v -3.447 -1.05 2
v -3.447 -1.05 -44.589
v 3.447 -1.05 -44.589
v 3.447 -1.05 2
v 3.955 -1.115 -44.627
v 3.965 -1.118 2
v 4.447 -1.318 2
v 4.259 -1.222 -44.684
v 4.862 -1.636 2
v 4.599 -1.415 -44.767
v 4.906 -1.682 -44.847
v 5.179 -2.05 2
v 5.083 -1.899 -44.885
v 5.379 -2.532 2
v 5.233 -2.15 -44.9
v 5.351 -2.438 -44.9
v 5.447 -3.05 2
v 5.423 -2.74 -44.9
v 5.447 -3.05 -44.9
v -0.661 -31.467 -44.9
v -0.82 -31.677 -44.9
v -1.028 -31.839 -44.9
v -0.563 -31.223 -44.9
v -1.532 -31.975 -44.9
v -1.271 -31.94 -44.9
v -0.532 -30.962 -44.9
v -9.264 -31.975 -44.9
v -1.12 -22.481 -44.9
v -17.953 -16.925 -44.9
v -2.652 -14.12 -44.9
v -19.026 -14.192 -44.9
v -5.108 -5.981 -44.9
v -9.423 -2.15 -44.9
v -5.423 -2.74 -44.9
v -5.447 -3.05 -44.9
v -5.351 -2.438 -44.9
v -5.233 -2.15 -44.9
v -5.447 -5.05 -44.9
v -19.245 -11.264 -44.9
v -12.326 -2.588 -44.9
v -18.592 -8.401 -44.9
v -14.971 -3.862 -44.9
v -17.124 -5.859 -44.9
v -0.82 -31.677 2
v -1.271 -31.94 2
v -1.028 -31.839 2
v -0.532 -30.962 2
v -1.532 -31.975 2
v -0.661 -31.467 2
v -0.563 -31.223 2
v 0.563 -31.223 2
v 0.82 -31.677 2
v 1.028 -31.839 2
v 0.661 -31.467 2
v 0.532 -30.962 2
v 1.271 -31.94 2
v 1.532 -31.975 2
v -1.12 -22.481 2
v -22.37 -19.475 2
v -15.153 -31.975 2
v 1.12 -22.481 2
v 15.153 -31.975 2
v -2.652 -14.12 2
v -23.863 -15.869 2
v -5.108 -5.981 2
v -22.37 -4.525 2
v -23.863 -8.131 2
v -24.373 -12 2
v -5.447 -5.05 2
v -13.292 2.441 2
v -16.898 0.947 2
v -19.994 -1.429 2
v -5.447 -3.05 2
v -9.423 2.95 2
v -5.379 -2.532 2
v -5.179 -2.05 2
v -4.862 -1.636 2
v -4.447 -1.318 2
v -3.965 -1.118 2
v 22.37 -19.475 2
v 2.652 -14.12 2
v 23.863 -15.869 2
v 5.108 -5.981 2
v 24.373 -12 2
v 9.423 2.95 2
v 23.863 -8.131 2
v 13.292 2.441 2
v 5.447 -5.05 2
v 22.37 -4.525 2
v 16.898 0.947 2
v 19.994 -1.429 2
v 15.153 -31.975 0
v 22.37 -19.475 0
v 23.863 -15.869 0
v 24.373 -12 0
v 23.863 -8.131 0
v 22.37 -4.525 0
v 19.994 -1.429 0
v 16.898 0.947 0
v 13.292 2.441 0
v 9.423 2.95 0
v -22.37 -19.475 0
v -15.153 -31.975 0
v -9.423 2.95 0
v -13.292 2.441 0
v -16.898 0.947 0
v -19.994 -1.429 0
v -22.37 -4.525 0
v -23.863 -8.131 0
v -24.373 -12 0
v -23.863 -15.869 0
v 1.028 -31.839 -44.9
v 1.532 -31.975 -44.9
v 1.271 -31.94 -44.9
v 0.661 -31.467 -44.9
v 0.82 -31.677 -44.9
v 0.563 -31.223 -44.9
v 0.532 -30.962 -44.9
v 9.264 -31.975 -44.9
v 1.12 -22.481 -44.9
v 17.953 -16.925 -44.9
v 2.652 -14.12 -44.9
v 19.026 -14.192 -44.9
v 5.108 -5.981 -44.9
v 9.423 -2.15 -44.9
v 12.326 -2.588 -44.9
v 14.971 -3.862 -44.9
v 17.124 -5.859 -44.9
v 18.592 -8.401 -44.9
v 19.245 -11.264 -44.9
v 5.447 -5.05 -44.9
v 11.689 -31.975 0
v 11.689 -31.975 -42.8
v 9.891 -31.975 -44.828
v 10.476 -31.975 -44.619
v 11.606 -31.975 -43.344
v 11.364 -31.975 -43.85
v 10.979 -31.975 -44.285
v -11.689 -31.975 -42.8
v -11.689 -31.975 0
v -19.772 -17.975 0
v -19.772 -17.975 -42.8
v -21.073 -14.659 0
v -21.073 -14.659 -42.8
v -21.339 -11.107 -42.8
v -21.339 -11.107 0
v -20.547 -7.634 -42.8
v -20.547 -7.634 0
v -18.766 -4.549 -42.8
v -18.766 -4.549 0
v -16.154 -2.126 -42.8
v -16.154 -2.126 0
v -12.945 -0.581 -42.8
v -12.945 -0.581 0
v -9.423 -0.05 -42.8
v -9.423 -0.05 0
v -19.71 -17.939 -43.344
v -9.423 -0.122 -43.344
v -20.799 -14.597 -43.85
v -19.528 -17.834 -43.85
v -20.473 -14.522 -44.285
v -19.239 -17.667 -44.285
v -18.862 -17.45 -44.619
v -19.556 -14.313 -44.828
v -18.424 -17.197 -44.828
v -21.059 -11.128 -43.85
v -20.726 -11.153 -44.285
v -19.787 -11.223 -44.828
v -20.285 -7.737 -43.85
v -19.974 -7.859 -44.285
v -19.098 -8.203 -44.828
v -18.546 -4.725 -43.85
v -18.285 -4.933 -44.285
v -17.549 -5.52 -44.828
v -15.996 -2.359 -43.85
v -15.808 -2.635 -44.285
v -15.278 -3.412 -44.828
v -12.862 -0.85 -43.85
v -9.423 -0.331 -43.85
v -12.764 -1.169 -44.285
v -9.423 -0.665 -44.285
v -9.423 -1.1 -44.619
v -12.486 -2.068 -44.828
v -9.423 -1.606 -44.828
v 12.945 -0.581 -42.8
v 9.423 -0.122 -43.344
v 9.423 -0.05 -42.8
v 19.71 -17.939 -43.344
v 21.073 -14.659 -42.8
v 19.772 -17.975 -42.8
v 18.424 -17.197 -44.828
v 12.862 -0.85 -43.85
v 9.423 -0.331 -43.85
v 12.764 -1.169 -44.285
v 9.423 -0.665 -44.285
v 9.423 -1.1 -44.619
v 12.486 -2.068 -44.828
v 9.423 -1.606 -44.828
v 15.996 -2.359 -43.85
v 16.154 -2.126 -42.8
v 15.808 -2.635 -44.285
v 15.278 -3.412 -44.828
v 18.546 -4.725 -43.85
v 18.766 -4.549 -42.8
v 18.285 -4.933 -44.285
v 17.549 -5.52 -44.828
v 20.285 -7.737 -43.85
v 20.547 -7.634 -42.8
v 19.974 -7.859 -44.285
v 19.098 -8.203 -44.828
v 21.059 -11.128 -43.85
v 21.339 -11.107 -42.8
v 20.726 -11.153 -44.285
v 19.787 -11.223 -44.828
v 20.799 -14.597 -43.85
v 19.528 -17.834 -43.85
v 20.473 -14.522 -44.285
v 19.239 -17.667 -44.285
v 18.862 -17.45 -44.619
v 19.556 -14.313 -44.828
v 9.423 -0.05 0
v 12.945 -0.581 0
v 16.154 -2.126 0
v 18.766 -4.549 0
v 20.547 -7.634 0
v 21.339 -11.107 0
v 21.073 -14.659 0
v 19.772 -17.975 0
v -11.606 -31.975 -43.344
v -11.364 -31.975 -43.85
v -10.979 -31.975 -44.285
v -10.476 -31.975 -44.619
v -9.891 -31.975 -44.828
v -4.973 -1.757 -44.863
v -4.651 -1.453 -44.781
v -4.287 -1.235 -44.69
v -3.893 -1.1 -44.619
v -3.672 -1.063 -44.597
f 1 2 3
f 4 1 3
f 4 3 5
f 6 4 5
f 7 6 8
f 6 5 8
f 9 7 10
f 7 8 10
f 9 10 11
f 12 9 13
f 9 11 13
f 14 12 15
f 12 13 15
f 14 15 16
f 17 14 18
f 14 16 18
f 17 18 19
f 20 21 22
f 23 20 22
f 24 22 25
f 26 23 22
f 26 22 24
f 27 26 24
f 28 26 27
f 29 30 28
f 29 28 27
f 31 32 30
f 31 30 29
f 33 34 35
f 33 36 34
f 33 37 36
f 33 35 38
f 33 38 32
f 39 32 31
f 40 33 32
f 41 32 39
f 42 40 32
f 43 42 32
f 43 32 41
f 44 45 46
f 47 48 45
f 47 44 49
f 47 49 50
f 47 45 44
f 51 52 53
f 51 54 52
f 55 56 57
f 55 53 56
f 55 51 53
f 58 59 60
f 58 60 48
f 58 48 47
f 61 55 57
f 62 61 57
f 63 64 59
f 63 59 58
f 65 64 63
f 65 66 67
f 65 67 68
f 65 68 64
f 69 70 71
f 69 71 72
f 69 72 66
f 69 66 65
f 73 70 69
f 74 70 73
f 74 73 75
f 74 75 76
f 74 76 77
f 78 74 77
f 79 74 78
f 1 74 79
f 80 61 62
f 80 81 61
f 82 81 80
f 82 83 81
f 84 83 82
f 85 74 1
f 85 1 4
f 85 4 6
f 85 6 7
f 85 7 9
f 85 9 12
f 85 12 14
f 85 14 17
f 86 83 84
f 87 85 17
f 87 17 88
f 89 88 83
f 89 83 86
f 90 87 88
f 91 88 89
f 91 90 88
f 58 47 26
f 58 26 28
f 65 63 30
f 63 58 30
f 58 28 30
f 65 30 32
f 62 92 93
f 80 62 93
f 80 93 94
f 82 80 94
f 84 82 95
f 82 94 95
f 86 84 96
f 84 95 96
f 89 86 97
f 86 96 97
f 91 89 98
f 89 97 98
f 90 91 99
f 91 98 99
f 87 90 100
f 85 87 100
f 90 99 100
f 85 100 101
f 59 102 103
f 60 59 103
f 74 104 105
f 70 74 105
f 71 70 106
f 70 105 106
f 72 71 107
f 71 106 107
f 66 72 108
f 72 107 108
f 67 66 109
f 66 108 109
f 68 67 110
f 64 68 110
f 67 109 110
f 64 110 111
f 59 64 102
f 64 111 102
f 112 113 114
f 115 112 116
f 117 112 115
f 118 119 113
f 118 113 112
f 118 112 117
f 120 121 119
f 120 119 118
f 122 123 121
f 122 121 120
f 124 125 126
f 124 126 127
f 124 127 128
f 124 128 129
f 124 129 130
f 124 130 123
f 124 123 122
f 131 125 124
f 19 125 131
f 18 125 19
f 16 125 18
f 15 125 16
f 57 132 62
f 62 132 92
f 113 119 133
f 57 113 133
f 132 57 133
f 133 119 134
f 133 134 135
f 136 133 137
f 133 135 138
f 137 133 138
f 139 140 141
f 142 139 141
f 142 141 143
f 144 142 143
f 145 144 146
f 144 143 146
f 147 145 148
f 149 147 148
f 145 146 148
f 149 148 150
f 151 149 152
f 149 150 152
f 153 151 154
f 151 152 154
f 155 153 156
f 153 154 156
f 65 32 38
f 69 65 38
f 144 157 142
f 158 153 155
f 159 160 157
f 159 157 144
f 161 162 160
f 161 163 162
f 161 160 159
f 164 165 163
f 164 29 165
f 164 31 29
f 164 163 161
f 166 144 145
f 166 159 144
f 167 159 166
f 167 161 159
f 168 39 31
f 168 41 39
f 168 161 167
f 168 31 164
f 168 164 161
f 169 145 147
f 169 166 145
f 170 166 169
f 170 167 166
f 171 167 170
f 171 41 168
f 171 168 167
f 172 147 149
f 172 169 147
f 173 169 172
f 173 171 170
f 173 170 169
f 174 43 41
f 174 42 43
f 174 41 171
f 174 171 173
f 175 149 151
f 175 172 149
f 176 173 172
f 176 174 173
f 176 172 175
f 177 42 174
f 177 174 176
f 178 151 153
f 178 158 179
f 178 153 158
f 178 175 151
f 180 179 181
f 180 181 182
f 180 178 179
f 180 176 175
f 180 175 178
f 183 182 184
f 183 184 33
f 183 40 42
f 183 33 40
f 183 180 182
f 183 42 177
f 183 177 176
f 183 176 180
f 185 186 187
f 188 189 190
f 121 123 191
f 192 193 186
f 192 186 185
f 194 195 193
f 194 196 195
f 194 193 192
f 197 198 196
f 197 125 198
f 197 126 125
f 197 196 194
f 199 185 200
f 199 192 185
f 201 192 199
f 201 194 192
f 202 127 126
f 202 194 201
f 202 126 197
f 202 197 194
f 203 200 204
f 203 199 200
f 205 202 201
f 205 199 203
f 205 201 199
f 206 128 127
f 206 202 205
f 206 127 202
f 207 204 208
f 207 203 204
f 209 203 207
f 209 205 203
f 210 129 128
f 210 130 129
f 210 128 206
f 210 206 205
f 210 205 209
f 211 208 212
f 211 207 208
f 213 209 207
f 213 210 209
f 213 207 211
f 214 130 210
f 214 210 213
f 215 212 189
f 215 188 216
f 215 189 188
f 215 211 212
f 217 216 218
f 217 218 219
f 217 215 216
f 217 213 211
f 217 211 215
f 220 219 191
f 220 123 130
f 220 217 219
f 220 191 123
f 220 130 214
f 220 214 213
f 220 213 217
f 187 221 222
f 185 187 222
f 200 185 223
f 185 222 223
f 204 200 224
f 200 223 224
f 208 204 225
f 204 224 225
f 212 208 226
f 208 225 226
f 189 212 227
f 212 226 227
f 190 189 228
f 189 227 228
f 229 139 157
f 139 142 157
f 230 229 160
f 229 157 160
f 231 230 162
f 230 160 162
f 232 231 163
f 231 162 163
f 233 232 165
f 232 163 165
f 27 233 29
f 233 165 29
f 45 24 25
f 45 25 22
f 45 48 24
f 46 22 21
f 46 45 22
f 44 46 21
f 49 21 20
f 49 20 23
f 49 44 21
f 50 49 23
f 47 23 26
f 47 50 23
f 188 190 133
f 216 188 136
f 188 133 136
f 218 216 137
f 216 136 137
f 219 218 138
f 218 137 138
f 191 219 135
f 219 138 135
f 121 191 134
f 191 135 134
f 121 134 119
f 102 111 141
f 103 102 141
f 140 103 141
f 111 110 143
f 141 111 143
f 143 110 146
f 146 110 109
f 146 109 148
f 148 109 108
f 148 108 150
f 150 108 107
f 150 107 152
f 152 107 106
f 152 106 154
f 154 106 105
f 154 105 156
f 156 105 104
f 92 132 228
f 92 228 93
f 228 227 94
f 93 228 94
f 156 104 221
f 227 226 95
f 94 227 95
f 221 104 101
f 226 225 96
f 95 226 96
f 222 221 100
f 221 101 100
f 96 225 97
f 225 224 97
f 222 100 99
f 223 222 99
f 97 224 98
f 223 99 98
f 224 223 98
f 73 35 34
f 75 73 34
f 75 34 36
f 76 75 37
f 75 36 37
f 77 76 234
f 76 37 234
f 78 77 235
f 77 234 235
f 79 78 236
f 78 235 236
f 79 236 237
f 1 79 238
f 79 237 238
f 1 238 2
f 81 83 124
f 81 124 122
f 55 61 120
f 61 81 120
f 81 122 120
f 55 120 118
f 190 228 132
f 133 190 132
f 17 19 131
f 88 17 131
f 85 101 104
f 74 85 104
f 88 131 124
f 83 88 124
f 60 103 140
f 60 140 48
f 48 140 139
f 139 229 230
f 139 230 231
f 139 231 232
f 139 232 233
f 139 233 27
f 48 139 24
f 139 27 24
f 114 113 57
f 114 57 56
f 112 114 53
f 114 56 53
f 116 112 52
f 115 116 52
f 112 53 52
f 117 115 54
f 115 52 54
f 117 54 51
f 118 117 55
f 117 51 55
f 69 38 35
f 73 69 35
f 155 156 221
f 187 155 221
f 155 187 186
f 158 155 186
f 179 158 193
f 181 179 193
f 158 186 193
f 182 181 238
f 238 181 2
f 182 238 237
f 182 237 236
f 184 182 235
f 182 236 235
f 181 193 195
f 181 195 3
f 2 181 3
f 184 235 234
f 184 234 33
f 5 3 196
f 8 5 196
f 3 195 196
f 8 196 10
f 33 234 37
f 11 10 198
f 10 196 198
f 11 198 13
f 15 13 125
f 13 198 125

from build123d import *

# Parameters (mm, degrees)
BOSS_EXTRUDE1_DEPTH     = 44.9
FILLET1_R               = 2.1
BOSS_EXTRUDE2_DEPTH     = 2
CUT_EXTRUDE1_DEPTH      = 61.269699517
CUT_EXTRUDE1_DEPTH_BACK = 61.269699517
FILLET2_R               = 1


with BuildPart() as part:
    # Sketch1 → Boss-Extrude1 (new body)
    with BuildSketch(Plane.XY):
        with BuildLine():
            Line((-11.688749537, -31.975), (-19.771653306, -17.975))
            ThreePointArc((-19.771653306, -17.975), (-19.771653306, -6.025), (-9.422649731, -0.05))
            Line((-9.422649731, -0.05), (9.422649731, -0.05))
            ThreePointArc((9.422649731, -0.05), (19.771653306, -6.025), (19.771653306, -17.975))
            Line((19.771653306, -17.975), (11.688749537, -31.975))
            Line((11.688749537, -31.975), (-11.688749537, -31.975))
        make_face()
    extrude(amount=-BOSS_EXTRUDE1_DEPTH)

    # Fillet1
    fillet1_edges = [part.edges().sort_by_distance(p)[0] for p in [
        (15.730201422, -24.975, -44.9),
        (19.771653306, -6.025, -44.9),
        (0, -0.05, -44.9),
        (-19.771653306, -6.025, -44.9),
        (-15.730201422, -24.975, -44.9),
    ]]
    fillet(fillet1_edges, radius=FILLET1_R)

    # Sketch2 → Boss-Extrude2 (add)
    with BuildSketch(Plane.XY):
        with BuildLine():
            Line((15.152851153, -31.975), (22.369729517, -19.475))
            ThreePointArc((22.369729517, -19.475), (22.369729517, -4.525), (9.422649731, 2.95))
            Line((9.422649731, 2.95), (-9.422649731, 2.95))
            ThreePointArc((-9.422649731, 2.95), (-22.369729517, -4.525), (-22.369729517, -19.475))
            Line((-22.369729517, -19.475), (-15.152851153, -31.975))
            Line((-15.152851153, -31.975), (15.152851153, -31.975))
        make_face()
    extrude(amount=BOSS_EXTRUDE2_DEPTH)

    # Sketch3 → Cut-Extrude1 (cut, two sides: drawn at the far end of the back side and taken through both)
    with BuildSketch(Plane.XY.offset(-CUT_EXTRUDE1_DEPTH_BACK)):
        with BuildLine():
            Line((-3.447387849, -1.05), (3.447387849, -1.05))
            ThreePointArc((3.447387849, -1.05), (4.861601412, -1.635786438), (5.447387849, -3.05))
            Line((5.447387849, -3.05), (5.447387849, -5.05))
            Line((5.447387849, -5.05), (5.10836082, -5.981469107))
            ThreePointArc((5.10836082, -5.981469107), (1.679610771, -18.777738497), (0.525, -31.975))
            Line((0.525, -31.975), (-0.525, -31.975))
            ThreePointArc((-0.525, -31.975), (-1.679610771, -18.777738497), (-5.10836082, -5.981469107))
            Line((-5.10836082, -5.981469107), (-5.447387849, -5.05))
            Line((-5.447387849, -5.05), (-5.447387849, -3.05))
            ThreePointArc((-5.447387849, -3.05), (-4.861601412, -1.635786438), (-3.447387849, -1.05))
        make_face()
    extrude(amount=CUT_EXTRUDE1_DEPTH + CUT_EXTRUDE1_DEPTH_BACK, mode=Mode.SUBTRACT)

    # Fillet2
    fillet2_edges = [part.edges().sort_by_distance(p)[0] for p in [
        (-0.525, -31.975, -21.45),
        (0.525, -31.975, -21.45),
    ]]
    fillet(fillet2_edges, radius=FILLET2_R)


solid = part.part
